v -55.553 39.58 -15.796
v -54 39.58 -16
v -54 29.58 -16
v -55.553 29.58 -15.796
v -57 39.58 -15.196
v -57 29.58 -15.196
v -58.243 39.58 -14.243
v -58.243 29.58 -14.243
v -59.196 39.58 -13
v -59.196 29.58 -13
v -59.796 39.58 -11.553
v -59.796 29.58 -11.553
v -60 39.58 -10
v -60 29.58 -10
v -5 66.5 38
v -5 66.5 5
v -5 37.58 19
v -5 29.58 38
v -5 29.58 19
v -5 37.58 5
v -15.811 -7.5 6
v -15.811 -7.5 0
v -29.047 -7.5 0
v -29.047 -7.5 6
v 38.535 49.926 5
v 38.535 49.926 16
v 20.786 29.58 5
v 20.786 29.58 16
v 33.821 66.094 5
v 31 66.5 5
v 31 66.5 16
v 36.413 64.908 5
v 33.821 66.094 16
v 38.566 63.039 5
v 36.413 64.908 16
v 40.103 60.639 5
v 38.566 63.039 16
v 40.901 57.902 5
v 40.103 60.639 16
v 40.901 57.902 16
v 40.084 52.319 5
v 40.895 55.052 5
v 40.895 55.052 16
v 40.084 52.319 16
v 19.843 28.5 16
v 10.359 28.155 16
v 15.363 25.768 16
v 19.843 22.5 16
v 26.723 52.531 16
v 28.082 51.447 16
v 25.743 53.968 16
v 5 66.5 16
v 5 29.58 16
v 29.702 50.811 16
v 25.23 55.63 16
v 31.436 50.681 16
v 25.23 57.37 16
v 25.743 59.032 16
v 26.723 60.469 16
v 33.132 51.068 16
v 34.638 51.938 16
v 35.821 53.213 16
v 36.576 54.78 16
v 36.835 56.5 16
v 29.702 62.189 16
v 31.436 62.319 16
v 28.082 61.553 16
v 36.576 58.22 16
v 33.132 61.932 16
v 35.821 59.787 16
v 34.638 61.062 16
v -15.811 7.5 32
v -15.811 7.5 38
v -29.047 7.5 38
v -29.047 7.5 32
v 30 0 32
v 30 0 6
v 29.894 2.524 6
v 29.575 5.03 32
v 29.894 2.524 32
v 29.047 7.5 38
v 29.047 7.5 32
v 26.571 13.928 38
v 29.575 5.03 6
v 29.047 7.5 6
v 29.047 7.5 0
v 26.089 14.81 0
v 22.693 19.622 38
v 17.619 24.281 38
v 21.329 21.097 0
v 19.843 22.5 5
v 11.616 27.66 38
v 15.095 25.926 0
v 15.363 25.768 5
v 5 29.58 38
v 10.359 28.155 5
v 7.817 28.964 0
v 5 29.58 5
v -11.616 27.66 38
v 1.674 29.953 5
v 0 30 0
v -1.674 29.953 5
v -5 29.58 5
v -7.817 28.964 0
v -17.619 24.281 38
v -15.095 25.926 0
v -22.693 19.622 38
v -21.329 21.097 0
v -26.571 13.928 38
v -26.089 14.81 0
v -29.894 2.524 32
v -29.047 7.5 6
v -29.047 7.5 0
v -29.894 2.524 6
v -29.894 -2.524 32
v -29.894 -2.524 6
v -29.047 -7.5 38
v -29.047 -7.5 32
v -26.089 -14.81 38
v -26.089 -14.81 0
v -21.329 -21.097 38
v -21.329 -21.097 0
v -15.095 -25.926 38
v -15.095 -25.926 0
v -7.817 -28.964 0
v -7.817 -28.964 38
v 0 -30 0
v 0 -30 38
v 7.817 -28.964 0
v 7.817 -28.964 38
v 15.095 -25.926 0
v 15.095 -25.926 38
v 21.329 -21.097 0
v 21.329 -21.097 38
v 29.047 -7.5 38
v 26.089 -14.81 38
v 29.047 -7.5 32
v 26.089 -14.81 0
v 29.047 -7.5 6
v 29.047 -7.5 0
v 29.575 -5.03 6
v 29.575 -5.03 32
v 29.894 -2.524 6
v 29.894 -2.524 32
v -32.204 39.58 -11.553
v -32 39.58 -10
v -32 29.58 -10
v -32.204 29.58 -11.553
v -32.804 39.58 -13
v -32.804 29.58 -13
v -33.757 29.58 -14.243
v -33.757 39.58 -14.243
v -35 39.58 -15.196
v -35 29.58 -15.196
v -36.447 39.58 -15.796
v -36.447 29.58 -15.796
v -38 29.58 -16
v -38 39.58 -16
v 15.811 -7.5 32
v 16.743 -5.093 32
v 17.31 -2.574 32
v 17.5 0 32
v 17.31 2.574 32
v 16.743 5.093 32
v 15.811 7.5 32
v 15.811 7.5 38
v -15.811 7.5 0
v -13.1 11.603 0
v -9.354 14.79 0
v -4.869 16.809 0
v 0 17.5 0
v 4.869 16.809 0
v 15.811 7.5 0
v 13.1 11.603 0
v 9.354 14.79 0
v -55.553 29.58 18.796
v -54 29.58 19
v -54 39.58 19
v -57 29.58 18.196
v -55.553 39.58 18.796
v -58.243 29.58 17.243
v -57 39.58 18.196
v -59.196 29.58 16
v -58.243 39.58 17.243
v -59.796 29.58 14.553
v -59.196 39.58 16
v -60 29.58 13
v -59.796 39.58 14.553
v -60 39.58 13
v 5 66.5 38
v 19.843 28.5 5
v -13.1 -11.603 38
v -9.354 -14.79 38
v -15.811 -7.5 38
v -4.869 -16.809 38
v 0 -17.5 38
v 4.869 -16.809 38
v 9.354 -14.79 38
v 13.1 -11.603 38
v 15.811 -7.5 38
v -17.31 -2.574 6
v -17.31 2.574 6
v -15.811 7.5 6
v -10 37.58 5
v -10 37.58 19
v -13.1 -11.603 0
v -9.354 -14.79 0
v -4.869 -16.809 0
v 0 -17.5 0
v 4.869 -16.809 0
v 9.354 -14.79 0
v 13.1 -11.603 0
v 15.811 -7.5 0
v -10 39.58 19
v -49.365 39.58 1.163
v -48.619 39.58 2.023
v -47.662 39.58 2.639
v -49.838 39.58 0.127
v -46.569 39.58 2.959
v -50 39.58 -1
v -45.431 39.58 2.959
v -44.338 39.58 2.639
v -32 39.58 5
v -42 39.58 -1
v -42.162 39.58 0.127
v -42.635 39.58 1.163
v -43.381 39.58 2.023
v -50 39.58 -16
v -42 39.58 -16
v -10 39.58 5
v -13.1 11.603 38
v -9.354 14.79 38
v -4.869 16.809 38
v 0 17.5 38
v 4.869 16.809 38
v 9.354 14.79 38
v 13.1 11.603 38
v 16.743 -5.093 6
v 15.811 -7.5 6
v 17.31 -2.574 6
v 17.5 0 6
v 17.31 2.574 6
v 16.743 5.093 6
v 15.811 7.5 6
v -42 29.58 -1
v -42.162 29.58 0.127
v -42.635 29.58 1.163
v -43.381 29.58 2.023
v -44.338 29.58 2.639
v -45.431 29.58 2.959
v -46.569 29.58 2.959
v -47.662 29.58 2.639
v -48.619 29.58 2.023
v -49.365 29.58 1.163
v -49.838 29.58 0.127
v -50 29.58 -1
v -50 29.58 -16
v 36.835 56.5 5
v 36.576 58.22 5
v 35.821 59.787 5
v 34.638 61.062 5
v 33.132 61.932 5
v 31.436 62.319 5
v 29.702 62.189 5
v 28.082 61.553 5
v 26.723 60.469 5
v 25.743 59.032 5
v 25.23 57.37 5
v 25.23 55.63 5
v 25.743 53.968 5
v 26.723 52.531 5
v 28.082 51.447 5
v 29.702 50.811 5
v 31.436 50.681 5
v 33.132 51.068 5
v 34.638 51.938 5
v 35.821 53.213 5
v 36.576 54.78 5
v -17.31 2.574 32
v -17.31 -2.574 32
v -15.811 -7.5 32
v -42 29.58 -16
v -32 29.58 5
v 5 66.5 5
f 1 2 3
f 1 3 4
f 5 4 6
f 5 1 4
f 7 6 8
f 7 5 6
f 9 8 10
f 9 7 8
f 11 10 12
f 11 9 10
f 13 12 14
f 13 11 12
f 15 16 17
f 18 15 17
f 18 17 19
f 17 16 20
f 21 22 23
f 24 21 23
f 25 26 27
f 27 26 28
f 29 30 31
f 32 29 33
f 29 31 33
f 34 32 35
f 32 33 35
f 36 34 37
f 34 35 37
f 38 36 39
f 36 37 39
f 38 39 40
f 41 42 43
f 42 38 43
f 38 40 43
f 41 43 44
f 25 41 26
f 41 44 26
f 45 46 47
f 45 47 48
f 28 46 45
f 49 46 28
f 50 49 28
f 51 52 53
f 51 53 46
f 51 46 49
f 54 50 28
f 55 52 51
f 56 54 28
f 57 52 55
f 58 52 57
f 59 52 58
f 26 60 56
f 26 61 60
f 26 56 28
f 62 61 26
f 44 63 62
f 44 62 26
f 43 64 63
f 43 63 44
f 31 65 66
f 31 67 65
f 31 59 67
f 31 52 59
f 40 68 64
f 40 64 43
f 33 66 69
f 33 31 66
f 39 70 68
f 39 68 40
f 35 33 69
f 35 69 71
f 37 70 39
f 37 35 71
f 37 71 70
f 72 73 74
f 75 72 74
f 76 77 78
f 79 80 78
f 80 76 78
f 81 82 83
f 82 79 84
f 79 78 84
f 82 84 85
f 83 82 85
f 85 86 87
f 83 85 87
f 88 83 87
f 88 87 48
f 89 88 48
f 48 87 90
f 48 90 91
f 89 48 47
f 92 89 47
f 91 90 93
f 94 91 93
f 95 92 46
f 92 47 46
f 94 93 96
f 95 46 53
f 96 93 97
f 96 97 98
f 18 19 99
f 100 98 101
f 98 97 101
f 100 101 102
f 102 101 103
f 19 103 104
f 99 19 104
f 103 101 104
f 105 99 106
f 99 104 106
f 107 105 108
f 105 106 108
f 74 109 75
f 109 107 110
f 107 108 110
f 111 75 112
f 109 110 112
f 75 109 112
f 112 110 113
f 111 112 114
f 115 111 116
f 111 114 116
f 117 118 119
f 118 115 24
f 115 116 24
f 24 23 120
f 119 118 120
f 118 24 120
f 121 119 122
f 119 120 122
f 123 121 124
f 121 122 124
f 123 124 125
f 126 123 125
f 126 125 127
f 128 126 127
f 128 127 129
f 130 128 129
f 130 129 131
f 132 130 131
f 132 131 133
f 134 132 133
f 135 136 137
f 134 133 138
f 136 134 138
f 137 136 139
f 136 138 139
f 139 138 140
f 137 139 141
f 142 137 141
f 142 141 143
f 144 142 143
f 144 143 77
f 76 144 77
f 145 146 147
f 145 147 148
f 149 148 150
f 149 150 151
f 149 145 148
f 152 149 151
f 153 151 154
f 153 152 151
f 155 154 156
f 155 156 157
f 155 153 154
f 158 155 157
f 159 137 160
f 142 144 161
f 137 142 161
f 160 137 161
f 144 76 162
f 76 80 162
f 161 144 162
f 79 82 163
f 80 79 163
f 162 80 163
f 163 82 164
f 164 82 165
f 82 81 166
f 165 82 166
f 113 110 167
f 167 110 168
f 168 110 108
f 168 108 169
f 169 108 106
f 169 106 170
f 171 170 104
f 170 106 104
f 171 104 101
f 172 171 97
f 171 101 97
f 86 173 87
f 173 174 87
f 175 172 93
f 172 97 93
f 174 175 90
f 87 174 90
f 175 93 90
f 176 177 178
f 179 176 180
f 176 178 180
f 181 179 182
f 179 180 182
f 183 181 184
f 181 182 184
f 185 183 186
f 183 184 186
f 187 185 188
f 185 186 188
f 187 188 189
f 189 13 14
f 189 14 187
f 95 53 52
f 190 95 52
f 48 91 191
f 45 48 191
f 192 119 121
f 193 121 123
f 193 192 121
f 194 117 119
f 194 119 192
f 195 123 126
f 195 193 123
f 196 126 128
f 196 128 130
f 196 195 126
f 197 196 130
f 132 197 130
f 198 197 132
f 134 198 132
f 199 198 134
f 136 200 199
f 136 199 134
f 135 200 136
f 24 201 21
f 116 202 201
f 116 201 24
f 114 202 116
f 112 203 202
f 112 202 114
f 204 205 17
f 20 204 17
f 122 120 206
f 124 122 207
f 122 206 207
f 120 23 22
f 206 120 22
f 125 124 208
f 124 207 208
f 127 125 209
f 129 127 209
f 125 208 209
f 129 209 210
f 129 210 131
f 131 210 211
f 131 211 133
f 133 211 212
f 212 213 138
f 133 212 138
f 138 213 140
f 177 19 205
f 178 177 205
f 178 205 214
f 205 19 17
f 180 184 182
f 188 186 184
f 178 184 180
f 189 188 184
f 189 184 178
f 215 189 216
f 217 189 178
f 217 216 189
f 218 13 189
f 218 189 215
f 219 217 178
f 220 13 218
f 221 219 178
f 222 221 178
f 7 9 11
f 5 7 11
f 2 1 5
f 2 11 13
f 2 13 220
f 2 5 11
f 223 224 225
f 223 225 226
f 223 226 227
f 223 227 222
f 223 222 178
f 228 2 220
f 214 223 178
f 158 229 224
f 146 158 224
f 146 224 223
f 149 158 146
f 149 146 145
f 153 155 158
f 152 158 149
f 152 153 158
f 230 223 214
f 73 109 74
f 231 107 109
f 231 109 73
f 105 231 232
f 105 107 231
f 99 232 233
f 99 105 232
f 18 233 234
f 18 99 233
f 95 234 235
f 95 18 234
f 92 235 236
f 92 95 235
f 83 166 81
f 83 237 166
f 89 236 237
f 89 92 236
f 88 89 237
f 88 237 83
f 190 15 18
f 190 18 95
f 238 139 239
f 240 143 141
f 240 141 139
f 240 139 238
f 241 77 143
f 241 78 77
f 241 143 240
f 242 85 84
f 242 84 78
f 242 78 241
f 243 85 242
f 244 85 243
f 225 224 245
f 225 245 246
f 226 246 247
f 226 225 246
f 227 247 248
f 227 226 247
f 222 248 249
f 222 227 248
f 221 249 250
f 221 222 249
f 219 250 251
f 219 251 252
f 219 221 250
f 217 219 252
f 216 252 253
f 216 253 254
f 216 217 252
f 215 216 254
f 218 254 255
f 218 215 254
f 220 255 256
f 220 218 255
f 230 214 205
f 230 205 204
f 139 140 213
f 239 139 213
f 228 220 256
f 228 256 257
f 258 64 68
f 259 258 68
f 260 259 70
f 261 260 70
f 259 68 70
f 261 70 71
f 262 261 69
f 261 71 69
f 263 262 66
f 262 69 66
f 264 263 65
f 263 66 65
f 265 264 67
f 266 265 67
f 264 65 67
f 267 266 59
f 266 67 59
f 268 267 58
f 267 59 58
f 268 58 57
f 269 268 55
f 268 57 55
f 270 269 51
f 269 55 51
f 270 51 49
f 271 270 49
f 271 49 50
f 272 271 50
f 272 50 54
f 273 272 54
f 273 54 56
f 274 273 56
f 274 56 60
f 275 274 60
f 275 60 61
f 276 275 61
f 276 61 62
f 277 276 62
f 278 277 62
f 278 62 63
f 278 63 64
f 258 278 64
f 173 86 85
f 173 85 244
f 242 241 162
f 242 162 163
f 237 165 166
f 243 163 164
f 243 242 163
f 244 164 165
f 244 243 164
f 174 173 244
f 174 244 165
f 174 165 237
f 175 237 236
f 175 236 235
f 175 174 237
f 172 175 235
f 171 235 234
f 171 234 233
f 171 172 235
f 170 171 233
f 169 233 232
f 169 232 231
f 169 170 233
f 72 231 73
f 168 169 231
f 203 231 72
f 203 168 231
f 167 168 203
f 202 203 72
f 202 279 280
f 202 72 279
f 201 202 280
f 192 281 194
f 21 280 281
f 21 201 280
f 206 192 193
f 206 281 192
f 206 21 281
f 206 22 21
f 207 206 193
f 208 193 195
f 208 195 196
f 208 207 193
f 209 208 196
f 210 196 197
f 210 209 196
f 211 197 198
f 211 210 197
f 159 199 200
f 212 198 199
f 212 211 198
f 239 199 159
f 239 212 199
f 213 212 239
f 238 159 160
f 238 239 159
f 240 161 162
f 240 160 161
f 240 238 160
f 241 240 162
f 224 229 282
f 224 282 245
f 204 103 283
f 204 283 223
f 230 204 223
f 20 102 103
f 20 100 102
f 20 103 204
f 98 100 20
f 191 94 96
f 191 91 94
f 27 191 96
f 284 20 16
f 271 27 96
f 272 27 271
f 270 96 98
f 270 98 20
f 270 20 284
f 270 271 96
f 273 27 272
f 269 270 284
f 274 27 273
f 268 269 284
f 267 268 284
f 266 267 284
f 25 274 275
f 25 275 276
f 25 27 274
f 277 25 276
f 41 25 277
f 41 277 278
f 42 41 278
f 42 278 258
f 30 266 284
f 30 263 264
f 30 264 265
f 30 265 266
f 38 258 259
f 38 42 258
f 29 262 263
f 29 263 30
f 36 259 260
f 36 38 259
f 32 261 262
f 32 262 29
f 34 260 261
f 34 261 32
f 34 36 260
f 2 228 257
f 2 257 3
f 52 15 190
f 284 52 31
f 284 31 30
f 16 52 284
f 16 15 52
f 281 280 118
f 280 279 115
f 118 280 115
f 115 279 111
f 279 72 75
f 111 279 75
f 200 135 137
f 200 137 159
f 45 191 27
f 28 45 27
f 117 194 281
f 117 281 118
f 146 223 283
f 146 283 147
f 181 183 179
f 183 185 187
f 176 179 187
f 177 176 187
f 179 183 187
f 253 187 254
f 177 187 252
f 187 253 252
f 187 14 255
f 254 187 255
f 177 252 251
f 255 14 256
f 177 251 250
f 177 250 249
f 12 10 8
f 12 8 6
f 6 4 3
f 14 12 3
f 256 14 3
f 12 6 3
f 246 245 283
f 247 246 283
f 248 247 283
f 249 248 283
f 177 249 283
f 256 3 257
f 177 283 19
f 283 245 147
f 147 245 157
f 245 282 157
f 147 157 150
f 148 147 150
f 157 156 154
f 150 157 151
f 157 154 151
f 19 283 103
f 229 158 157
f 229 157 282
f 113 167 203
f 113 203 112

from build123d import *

# Parameters (mm, degrees)
SKETCH1_R           = 30
SKETCH1_R_2         = 17.5
BOSS_EXTRUDE1_DEPTH = 38
BOSS_EXTRUDE2_START = -33
BOSS_EXTRUDE2_DEPTH = 33
SKETCH6_W           = 11
SKETCH6_H           = 36.919601085
BOSS_EXTRUDE3_DEPTH = 41.84
SKETCH8_R           = 5.835
CUT_EXTRUDE2_DEPTH  = 41.84
BOSS_EXTRUDE4_DEPTH = 11
SKETCH13_W          = 14
SKETCH13_H          = 10
BOSS_EXTRUDE7_DEPTH = 55
SKETCH14_W          = 5
SKETCH14_H          = 14
CUT_EXTRUDE3_DEPTH  = 2
BOSS_EXTRUDE8_DEPTH = 10
CUT_EXTRUDE4_DEPTH  = 100.425509369
SKETCH18_W          = 27.083405909
SKETCH18_H          = 15
CUT_EXTRUDE5_DEPTH  = 6


with BuildPart() as part:
    # Sketch1 → Boss-Extrude1 (new body)
    with BuildSketch(Plane.XY):
        Circle(SKETCH1_R)
        Circle(SKETCH1_R_2, mode=Mode.SUBTRACT)
    extrude(amount=BOSS_EXTRUDE1_DEPTH)

    # Sketch3 → Boss-Extrude2 (add)
    with BuildSketch(Plane.XY.offset(38).offset(BOSS_EXTRUDE2_START)):
        with BuildLine():
            Line((5, 29.580398915), (5, 66.5))
            Line((5, 66.5), (-5, 66.5))
            Line((-5, 66.5), (-5, 29.580398915))
            ThreePointArc((-5, 29.580398915), (0, 30), (5, 29.580398915))
        make_face()
    extrude(amount=BOSS_EXTRUDE2_DEPTH)

    # Sketch6 → Boss-Extrude3 (add)
    with BuildSketch(Plane(origin=(5, 0, 0), x_dir=(0, 0, -1), z_dir=(1, 0, 0))):
        with Locations((-10.5, 48.040199458)):
            Rectangle(SKETCH6_W, SKETCH6_H)
    extrude(amount=BOSS_EXTRUDE3_DEPTH)

    # Sketch8 → Cut-Extrude2 (cut)
    with BuildSketch(Plane.XY.offset(16)):
        with BuildLine():
            Line((38.535426242, 49.92600948), (19.843134833, 28.5))
            Line((19.843134833, 28.5), (19.843134833, 22.5))
            Line((19.843134833, 22.5), (50.730835644, 21.613123559))
            Line((50.730835644, 21.613123559), (58.316291642, 73.170252493))
            Line((58.316291642, 73.170252493), (32.080152152, 77.030302224))
            Line((32.080152152, 77.030302224), (31, 66.5))
            ThreePointArc((31, 66.5), (40.103293503, 60.638846144), (38.535426242, 49.92600948))
        make_face()
        with Locations((31, 56.5)):
            Circle(SKETCH8_R)
    extrude(amount=-CUT_EXTRUDE2_DEPTH, mode=Mode.SUBTRACT)

    # Sketch11 → Boss-Extrude4 (add)
    with BuildSketch(Plane(origin=(0, 0, 5), x_dir=(-1, 0, 0), z_dir=(0, 0, -1))):
        with BuildLine():
            Line((-19.843134833, 22.5), (-19.843134833, 28.5))
            Line((-19.843134833, 28.5), (-20.785686986, 29.580398915))
            Line((-20.785686986, 29.580398915), (-5, 29.580398915))
            ThreePointArc((-5, 29.580398915), (-12.91620491, 27.077142588), (-19.843134833, 22.5))
        make_face()
    extrude(amount=-BOSS_EXTRUDE4_DEPTH)

    # Sketch13 → Boss-Extrude7 (add)
    with BuildSketch(Plane.ZY.offset(5)):
        with Locations((12, 34.580398915)):
            Rectangle(SKETCH13_W, SKETCH13_H)
    extrude(amount=BOSS_EXTRUDE7_DEPTH)

    # Sketch14 → Cut-Extrude3 (cut)
    with BuildSketch(Plane(origin=(0, 39.580398915, 0), x_dir=(1, 0, 0), z_dir=(0, 1, 0))):
        with Locations((-7.5, -12)):
            Rectangle(SKETCH14_W, SKETCH14_H)
    extrude(amount=-CUT_EXTRUDE3_DEPTH, mode=Mode.SUBTRACT)

    # Sketch15 → Boss-Extrude8 (add)
    with BuildSketch(Plane(origin=(0, 39.580398915, 0), x_dir=(1, 0, 0), z_dir=(0, 1, 0))):
        with BuildLine():
            Line((-60, 10), (-60, -5))
            Line((-60, -5), (-32, -5))
            Line((-32, -5), (-32, 10))
            ThreePointArc((-32, 10), (-33.757359313, 14.242640687), (-38, 16))
            Line((-38, 16), (-42, 16))
            Line((-42, 16), (-42, 1))
            ThreePointArc((-42, 1), (-46, -3), (-50, 1))
            Line((-50, 1), (-50, 16))
            Line((-50, 16), (-54, 16))
            ThreePointArc((-54, 16), (-58.242640687, 14.242640687), (-60, 10))
        make_face()
    extrude(amount=-BOSS_EXTRUDE8_DEPTH)

    # Sketch16 → Cut-Extrude4 (cut, through all)
    with BuildSketch(Plane(origin=(0, 39.580398915, 0), x_dir=(1, 0, 0), z_dir=(0, 1, 0))):
        with BuildLine():
            ThreePointArc((-54, -19), (-58.242640687, -17.242640687), (-60, -13))
            Line((-60, -13), (-60, -19))
            Line((-60, -19), (-54, -19))
        make_face()
    extrude(amount=-CUT_EXTRUDE4_DEPTH, mode=Mode.SUBTRACT)

    # Sketch18 → Cut-Extrude5 (cut)
    with BuildSketch(Plane(origin=(0, 0, 0), x_dir=(-1, 0, 0), z_dir=(0, 0, -1))):
        with Locations((-23.74070021, 0)):
            Rectangle(SKETCH18_W, SKETCH18_H)
        with Locations((23.74070021, 0)):
            Rectangle(SKETCH18_W, SKETCH18_H)
    cut_extrude5 = extrude(amount=-CUT_EXTRUDE5_DEPTH, mode=Mode.SUBTRACT)

    # Mirror1: Cut-Extrude5 across plane
    add(cut_extrude5.mirror(Plane.XY.offset(19)), mode=Mode.SUBTRACT)


solid = part.part
